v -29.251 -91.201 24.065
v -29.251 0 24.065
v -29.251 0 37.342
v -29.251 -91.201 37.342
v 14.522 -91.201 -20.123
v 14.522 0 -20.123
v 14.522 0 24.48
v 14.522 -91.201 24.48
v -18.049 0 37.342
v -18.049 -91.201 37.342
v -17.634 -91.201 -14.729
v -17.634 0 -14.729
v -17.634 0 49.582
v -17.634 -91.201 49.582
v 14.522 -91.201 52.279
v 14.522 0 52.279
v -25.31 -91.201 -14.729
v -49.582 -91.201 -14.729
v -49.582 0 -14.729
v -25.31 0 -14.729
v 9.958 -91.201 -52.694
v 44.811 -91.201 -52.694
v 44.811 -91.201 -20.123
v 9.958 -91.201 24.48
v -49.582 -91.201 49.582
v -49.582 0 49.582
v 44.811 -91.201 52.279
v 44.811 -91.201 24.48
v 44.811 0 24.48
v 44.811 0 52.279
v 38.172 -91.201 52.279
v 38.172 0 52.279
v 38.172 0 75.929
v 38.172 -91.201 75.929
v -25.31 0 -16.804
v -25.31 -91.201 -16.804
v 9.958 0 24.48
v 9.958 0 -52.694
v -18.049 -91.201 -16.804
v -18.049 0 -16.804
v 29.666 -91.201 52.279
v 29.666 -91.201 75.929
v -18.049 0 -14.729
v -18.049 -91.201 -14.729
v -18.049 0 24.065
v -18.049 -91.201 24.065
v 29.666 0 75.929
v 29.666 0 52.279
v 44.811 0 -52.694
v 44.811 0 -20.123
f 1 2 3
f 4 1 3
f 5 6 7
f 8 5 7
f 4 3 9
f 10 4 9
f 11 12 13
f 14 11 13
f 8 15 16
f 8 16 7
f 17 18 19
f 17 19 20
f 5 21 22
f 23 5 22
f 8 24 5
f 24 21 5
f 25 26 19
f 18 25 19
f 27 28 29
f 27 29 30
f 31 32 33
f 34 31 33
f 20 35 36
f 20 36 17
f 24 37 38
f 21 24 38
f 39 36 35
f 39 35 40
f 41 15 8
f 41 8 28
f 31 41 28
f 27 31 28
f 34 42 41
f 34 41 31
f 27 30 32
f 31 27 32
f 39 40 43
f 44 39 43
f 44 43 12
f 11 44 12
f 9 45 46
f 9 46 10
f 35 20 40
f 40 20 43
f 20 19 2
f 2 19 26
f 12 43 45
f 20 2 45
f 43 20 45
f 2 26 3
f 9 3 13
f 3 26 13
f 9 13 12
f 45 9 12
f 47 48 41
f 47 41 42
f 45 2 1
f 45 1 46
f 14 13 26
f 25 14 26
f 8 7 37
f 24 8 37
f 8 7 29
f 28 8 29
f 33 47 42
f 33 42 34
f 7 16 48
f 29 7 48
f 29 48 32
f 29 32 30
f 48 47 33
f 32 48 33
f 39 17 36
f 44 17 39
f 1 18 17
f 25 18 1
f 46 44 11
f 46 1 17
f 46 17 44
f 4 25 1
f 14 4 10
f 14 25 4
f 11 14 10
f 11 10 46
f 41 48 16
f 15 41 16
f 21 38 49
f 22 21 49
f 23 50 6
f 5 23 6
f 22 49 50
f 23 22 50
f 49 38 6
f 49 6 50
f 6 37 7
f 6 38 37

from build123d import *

# Parameters (mm, degrees)
F0_W     = 8.5057541728
F0_H     = 23.6501097679
F1_DEPTH = 91.2012979388
F0_W_2   = 11.2026780844
F0_H_2   = 13.2772549987
F0_W_3   = 7.2609931231
F0_H_3   = 2.0745694637
F0_H_4   = 26.7619639635


with BuildPart() as f1:
    # F0 (on Front) → F1 (new body)
    with BuildSketch(Plane.XZ):
        with Locations((33.9192189276, 64.1042664647)):
            Rectangle(F0_W, F0_H)
        Polygon((14.5219713449, 24.4799554348), (44.8107123375, 24.4799554348), (44.8107123375, 52.2792115808), (38.172096014, 52.2792115808), (29.6663418412, 52.2792115808), (14.5219713449, 52.2792115808), align=None)
    extrude(amount=F1_DEPTH)


with BuildPart() as f1b:
    # F0 (on Front) → F1, piece 2 (new body)
    with BuildSketch(Plane.XZ):
        Polygon((-25.3098011017, -14.7294402122), (-25.3098011017, 12.0325237513), (-18.0488079786, 12.0325237513), (-18.0488079786, -14.7294402122), (-17.6338851452, -14.7294402122), (-17.6338851452, 49.5822653174), (-49.5822876692, 49.5822653174), (-49.5822876692, -14.7294402122), align=None)
        with Locations((-23.6501470208, 30.7036675513)):
            Rectangle(F0_W_2, F0_H_2, mode=Mode.SUBTRACT)
        with Locations((-21.6793045402, -15.7667249441)):
            Rectangle(F0_W_3, F0_H_3)
        with Locations((-21.6793045402, -1.3484582305)):
            Rectangle(F0_W_3, F0_H_4)
    extrude(amount=F1_DEPTH)


with BuildPart() as f1c:
    # F0 (on Front) → F1, piece 3 (new body)
    with BuildSketch(Plane.XZ):
        Polygon((44.8107123375, -52.6940971613), (44.8107123375, -20.1233327389), (14.5219713449, -20.1233327389), (14.5219713449, 24.4799554348), (9.957909584, 24.4799554348), (9.957909584, -52.6940971613), align=None)
    extrude(amount=F1_DEPTH)


solid = Compound([f1.part, f1b.part, f1c.part])
